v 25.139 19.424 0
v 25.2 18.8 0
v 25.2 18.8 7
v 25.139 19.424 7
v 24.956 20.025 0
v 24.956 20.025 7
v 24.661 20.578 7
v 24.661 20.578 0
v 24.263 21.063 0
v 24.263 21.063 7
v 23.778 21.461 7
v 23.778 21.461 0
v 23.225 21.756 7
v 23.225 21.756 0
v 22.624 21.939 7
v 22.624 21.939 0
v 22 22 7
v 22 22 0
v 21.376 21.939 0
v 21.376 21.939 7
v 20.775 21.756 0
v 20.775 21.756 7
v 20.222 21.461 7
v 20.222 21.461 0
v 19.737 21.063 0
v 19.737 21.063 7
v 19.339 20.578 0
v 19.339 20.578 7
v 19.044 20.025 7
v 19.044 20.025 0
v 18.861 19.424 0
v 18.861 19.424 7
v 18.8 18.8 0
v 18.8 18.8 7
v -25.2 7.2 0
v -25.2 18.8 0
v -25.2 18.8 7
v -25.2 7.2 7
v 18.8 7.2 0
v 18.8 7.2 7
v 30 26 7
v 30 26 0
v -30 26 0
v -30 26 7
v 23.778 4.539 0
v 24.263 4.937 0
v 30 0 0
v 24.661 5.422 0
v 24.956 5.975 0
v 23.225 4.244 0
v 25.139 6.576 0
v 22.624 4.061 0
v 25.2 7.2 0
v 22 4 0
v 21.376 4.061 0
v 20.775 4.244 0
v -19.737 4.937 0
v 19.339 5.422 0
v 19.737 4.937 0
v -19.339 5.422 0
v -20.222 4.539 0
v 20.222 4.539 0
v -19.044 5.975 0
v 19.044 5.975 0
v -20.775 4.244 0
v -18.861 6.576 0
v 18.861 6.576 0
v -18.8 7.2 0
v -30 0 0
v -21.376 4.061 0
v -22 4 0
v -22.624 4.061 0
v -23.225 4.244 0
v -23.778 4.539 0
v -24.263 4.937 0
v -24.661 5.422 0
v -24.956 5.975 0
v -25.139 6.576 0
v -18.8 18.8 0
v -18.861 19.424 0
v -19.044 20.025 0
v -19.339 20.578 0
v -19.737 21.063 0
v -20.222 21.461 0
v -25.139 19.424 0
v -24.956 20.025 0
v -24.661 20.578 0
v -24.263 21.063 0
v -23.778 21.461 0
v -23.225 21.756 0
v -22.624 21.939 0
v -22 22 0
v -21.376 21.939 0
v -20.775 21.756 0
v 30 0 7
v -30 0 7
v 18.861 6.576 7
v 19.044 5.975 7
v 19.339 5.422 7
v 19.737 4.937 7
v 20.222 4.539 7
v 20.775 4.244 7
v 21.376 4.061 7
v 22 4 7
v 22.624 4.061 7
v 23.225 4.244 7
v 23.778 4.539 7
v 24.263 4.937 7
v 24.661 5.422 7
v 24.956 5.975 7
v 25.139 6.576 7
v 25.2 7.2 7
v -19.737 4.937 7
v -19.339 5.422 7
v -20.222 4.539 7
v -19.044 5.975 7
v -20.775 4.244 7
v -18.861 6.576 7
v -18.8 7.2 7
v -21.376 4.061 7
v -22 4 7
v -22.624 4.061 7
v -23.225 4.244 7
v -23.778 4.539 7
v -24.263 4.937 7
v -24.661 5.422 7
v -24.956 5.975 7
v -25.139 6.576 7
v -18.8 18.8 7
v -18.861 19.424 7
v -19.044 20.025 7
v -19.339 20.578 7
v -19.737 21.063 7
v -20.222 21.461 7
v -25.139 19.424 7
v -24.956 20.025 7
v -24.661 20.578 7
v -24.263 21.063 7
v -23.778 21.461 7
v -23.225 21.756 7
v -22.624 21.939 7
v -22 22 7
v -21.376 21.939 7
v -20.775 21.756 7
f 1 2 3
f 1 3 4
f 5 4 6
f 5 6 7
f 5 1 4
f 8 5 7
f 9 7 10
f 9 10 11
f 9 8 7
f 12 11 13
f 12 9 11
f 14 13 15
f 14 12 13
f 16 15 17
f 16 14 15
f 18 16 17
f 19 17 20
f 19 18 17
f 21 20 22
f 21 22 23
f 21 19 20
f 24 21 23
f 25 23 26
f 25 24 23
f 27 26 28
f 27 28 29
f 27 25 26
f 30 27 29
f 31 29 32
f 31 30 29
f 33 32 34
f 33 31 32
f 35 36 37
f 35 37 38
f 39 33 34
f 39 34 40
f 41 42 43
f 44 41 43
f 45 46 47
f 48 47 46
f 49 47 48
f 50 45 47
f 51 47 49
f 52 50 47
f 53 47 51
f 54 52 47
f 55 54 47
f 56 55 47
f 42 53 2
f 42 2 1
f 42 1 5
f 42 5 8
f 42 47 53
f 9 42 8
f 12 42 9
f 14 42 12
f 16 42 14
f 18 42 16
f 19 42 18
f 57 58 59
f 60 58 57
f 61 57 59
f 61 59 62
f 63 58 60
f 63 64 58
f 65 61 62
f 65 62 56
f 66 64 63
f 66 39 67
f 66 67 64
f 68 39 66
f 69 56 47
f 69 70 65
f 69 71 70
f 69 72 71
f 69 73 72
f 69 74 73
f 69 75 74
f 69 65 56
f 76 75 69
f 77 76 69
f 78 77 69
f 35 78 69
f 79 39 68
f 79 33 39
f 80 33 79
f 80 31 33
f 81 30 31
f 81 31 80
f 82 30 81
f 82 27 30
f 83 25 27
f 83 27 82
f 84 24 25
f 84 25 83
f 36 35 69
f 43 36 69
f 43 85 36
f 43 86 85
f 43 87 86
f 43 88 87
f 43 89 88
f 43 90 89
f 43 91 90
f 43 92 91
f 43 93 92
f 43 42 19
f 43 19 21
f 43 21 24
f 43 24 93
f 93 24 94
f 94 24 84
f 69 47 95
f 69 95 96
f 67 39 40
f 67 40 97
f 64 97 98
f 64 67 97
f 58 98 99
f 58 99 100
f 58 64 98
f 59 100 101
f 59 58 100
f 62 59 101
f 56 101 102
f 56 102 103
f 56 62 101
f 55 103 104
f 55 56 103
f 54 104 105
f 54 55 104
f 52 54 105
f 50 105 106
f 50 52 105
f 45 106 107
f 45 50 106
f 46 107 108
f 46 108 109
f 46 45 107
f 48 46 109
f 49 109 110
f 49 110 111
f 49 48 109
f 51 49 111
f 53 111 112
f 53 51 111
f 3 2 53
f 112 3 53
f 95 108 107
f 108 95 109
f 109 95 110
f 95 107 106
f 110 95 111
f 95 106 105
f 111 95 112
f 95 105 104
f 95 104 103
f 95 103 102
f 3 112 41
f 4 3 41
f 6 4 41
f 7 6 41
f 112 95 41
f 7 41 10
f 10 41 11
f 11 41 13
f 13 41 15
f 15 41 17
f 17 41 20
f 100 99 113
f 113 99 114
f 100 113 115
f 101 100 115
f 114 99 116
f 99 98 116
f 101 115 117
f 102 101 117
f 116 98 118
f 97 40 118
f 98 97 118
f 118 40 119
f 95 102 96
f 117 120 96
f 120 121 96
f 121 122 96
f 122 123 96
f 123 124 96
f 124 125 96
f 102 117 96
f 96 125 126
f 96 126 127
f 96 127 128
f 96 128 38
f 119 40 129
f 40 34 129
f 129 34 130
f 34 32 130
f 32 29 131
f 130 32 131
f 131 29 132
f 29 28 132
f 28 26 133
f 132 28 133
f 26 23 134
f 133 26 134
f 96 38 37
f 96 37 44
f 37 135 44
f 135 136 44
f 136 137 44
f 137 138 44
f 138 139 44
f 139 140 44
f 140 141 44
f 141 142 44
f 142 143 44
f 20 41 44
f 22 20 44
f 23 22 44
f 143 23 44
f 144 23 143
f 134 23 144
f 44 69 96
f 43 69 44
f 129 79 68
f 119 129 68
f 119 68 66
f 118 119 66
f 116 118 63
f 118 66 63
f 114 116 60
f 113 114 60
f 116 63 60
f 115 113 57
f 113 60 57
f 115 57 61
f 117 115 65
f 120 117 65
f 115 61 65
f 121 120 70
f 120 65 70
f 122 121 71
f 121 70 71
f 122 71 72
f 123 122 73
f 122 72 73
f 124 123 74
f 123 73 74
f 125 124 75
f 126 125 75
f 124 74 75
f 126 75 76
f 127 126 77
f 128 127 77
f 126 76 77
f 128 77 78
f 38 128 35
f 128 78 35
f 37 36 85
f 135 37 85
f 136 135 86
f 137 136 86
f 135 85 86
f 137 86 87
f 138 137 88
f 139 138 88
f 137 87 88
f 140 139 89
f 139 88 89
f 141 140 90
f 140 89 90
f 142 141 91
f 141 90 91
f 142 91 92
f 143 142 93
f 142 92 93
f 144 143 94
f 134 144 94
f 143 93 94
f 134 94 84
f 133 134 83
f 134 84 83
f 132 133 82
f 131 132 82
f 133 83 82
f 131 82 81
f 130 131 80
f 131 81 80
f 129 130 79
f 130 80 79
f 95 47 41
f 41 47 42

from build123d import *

# Parameters (mm, degrees)
SKETCH_W  = 30
SKETCH_H  = 26
PAD_DEPTH = 7


with BuildPart() as part:
    # Sketch → Pad (new body)
    with BuildSketch(Plane.XY):
        with Locations((15, 13)):
            Rectangle(SKETCH_W, SKETCH_H)
        with BuildLine():
            ThreePointArc((25.2, 18.8), (22, 22), (18.8, 18.8))
            Line((18.8, 18.8), (18.8, 7.2))
            ThreePointArc((18.8, 7.2), (22, 4), (25.2, 7.2))
            Line((25.2, 18.8), (25.2, 7.2))
        make_face(mode=Mode.SUBTRACT)
    pad = extrude(amount=PAD_DEPTH)

    # Mirrored: Pad across Sketch V_Axis
    add(pad.mirror(Plane(origin=(0, 0, 0), x_dir=(0, 0, 1), z_dir=(1, 0, 0))))


solid = part.part
